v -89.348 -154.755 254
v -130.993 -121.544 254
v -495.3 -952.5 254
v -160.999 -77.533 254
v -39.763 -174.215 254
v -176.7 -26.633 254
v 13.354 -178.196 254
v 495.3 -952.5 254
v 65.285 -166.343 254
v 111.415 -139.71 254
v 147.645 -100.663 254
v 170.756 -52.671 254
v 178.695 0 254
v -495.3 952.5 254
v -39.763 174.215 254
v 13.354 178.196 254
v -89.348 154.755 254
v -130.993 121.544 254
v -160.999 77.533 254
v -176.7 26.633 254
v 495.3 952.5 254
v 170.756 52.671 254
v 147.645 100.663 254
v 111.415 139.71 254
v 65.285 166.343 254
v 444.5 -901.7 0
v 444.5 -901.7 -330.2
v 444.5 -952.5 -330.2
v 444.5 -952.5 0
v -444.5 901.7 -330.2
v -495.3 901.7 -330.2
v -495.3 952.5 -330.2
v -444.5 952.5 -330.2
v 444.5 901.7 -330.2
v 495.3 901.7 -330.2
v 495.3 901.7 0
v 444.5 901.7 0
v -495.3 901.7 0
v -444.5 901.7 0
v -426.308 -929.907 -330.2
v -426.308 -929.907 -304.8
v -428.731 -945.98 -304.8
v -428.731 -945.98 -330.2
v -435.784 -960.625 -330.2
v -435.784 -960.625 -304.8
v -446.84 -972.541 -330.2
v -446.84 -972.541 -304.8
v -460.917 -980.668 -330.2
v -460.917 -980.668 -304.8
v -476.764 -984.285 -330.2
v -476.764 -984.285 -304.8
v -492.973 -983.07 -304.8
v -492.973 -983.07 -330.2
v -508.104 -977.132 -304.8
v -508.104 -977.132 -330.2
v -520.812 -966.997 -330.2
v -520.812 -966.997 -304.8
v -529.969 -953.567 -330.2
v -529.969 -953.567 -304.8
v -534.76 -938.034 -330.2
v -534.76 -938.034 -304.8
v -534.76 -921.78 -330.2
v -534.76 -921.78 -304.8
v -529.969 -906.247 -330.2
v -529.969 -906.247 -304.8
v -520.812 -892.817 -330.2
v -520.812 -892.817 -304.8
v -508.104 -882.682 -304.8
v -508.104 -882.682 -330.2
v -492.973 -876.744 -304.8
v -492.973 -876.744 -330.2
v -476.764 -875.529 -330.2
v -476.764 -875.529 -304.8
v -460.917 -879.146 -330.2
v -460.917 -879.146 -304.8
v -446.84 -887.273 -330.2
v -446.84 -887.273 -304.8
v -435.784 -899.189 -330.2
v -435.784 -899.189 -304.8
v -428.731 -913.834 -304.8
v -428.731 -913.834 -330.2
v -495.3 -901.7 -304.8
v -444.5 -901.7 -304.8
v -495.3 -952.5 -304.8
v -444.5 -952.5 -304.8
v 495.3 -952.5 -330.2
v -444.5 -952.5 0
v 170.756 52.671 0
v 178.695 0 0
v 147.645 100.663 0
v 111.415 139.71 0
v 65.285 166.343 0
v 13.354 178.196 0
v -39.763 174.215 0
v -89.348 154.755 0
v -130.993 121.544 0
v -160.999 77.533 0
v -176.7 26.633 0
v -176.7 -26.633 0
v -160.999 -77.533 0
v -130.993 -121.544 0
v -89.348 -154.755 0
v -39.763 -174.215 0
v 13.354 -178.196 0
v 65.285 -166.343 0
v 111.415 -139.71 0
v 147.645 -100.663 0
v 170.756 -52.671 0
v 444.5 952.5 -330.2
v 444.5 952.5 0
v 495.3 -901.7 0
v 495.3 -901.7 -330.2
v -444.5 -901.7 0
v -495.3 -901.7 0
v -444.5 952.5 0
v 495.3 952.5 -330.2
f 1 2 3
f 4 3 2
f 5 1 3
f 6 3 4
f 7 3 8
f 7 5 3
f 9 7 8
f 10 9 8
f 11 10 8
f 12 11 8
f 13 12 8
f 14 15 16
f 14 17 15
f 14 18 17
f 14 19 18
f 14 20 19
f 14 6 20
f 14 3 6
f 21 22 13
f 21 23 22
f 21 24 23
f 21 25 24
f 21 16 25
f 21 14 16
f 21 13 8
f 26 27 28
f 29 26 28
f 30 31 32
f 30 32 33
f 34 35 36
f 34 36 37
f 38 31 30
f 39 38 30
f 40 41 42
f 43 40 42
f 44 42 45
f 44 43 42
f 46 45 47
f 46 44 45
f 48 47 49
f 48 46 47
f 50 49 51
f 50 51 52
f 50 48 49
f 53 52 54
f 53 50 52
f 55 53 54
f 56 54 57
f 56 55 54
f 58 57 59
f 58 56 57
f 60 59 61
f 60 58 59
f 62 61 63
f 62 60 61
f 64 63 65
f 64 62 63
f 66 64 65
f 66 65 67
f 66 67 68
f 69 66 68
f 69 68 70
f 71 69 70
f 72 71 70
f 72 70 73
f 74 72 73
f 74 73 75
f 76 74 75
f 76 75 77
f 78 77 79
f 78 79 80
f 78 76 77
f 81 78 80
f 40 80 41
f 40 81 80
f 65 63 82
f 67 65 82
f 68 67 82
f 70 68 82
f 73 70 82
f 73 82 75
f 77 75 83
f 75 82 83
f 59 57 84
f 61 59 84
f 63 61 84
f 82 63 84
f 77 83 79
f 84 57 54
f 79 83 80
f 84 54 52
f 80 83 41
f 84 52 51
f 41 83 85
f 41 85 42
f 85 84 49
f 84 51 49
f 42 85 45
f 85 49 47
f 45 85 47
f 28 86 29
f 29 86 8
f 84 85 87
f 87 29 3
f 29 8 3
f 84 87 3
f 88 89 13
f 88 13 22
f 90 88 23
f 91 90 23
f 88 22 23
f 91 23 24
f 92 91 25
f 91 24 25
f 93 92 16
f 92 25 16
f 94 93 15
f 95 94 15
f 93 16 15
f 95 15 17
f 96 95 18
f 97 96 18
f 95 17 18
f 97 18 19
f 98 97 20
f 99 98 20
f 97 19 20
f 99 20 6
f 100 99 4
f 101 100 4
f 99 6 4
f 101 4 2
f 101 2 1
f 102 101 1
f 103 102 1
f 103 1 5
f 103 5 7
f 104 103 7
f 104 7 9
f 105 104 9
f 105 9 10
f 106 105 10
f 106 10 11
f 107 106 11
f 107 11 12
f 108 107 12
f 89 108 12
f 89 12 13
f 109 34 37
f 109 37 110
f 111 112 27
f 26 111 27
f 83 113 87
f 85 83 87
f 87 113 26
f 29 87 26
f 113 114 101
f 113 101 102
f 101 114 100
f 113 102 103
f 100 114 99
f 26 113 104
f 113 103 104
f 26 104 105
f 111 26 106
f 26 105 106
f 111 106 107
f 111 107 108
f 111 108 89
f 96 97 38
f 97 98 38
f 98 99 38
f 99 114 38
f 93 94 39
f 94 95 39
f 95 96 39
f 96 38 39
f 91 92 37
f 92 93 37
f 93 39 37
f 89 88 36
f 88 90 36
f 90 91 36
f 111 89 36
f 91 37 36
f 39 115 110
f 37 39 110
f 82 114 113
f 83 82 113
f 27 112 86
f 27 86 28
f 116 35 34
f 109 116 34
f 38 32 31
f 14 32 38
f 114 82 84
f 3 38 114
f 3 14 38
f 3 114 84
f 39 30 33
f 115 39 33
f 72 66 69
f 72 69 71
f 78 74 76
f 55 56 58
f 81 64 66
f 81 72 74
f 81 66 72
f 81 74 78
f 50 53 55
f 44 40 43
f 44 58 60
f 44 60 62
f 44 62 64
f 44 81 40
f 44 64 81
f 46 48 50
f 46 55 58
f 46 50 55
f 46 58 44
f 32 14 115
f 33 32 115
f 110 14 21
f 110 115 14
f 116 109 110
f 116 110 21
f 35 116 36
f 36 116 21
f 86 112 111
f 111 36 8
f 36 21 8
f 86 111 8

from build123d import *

# Parameters (mm, degrees)
F0_W     = 990.6
F0_H     = 1905
F1_DEPTH = 254
F2_W     = 50.8
F2_H     = 50.8
F3_DEPTH = 330.2
F6_R     = 178.695412
F7_DEPTH = 584.201
F8_R     = 54.530452
F9_DEPTH = 25.4


with BuildPart() as f1:
    # F0 (on Top) → F1 (new body)
    with BuildSketch(Plane.XY):
        Rectangle(F0_W, F0_H)
    extrude(amount=F1_DEPTH)

    # F2 (on face) → F3 (join)
    with BuildSketch(Plane(origin=(0, 0, 0), x_dir=(1, 0, 0), z_dir=(0, 0, -1))):
        with Locations((-469.9, 927.1)):
            Rectangle(F2_W, F2_H)
    extrude(amount=F3_DEPTH)

    # F4: F1 across plane


with BuildPart() as f1_1:
    add(f1.part)
    add(f1.part.mirror(Plane.YZ))

    # F5: F1 across plane


with BuildPart() as f1_2:
    add(f1_1.part)
    add(f1_1.part.mirror(Plane.XZ))

    # F6 (on face) → F7 (cut, through all)
    with BuildSketch(Plane.XY.offset(254)):
        Circle(F6_R)
    extrude(amount=-F7_DEPTH, mode=Mode.SUBTRACT)

    # F8 (on face) → F9 (join)
    with BuildSketch(Plane(origin=(0, 0, -330.2), x_dir=(1, 0, 0), z_dir=(0, 0, -1))):
        with Locations((-480.838805, 929.906964)):
            Circle(F8_R)
    extrude(amount=-F9_DEPTH)


solid = f1_2.part
